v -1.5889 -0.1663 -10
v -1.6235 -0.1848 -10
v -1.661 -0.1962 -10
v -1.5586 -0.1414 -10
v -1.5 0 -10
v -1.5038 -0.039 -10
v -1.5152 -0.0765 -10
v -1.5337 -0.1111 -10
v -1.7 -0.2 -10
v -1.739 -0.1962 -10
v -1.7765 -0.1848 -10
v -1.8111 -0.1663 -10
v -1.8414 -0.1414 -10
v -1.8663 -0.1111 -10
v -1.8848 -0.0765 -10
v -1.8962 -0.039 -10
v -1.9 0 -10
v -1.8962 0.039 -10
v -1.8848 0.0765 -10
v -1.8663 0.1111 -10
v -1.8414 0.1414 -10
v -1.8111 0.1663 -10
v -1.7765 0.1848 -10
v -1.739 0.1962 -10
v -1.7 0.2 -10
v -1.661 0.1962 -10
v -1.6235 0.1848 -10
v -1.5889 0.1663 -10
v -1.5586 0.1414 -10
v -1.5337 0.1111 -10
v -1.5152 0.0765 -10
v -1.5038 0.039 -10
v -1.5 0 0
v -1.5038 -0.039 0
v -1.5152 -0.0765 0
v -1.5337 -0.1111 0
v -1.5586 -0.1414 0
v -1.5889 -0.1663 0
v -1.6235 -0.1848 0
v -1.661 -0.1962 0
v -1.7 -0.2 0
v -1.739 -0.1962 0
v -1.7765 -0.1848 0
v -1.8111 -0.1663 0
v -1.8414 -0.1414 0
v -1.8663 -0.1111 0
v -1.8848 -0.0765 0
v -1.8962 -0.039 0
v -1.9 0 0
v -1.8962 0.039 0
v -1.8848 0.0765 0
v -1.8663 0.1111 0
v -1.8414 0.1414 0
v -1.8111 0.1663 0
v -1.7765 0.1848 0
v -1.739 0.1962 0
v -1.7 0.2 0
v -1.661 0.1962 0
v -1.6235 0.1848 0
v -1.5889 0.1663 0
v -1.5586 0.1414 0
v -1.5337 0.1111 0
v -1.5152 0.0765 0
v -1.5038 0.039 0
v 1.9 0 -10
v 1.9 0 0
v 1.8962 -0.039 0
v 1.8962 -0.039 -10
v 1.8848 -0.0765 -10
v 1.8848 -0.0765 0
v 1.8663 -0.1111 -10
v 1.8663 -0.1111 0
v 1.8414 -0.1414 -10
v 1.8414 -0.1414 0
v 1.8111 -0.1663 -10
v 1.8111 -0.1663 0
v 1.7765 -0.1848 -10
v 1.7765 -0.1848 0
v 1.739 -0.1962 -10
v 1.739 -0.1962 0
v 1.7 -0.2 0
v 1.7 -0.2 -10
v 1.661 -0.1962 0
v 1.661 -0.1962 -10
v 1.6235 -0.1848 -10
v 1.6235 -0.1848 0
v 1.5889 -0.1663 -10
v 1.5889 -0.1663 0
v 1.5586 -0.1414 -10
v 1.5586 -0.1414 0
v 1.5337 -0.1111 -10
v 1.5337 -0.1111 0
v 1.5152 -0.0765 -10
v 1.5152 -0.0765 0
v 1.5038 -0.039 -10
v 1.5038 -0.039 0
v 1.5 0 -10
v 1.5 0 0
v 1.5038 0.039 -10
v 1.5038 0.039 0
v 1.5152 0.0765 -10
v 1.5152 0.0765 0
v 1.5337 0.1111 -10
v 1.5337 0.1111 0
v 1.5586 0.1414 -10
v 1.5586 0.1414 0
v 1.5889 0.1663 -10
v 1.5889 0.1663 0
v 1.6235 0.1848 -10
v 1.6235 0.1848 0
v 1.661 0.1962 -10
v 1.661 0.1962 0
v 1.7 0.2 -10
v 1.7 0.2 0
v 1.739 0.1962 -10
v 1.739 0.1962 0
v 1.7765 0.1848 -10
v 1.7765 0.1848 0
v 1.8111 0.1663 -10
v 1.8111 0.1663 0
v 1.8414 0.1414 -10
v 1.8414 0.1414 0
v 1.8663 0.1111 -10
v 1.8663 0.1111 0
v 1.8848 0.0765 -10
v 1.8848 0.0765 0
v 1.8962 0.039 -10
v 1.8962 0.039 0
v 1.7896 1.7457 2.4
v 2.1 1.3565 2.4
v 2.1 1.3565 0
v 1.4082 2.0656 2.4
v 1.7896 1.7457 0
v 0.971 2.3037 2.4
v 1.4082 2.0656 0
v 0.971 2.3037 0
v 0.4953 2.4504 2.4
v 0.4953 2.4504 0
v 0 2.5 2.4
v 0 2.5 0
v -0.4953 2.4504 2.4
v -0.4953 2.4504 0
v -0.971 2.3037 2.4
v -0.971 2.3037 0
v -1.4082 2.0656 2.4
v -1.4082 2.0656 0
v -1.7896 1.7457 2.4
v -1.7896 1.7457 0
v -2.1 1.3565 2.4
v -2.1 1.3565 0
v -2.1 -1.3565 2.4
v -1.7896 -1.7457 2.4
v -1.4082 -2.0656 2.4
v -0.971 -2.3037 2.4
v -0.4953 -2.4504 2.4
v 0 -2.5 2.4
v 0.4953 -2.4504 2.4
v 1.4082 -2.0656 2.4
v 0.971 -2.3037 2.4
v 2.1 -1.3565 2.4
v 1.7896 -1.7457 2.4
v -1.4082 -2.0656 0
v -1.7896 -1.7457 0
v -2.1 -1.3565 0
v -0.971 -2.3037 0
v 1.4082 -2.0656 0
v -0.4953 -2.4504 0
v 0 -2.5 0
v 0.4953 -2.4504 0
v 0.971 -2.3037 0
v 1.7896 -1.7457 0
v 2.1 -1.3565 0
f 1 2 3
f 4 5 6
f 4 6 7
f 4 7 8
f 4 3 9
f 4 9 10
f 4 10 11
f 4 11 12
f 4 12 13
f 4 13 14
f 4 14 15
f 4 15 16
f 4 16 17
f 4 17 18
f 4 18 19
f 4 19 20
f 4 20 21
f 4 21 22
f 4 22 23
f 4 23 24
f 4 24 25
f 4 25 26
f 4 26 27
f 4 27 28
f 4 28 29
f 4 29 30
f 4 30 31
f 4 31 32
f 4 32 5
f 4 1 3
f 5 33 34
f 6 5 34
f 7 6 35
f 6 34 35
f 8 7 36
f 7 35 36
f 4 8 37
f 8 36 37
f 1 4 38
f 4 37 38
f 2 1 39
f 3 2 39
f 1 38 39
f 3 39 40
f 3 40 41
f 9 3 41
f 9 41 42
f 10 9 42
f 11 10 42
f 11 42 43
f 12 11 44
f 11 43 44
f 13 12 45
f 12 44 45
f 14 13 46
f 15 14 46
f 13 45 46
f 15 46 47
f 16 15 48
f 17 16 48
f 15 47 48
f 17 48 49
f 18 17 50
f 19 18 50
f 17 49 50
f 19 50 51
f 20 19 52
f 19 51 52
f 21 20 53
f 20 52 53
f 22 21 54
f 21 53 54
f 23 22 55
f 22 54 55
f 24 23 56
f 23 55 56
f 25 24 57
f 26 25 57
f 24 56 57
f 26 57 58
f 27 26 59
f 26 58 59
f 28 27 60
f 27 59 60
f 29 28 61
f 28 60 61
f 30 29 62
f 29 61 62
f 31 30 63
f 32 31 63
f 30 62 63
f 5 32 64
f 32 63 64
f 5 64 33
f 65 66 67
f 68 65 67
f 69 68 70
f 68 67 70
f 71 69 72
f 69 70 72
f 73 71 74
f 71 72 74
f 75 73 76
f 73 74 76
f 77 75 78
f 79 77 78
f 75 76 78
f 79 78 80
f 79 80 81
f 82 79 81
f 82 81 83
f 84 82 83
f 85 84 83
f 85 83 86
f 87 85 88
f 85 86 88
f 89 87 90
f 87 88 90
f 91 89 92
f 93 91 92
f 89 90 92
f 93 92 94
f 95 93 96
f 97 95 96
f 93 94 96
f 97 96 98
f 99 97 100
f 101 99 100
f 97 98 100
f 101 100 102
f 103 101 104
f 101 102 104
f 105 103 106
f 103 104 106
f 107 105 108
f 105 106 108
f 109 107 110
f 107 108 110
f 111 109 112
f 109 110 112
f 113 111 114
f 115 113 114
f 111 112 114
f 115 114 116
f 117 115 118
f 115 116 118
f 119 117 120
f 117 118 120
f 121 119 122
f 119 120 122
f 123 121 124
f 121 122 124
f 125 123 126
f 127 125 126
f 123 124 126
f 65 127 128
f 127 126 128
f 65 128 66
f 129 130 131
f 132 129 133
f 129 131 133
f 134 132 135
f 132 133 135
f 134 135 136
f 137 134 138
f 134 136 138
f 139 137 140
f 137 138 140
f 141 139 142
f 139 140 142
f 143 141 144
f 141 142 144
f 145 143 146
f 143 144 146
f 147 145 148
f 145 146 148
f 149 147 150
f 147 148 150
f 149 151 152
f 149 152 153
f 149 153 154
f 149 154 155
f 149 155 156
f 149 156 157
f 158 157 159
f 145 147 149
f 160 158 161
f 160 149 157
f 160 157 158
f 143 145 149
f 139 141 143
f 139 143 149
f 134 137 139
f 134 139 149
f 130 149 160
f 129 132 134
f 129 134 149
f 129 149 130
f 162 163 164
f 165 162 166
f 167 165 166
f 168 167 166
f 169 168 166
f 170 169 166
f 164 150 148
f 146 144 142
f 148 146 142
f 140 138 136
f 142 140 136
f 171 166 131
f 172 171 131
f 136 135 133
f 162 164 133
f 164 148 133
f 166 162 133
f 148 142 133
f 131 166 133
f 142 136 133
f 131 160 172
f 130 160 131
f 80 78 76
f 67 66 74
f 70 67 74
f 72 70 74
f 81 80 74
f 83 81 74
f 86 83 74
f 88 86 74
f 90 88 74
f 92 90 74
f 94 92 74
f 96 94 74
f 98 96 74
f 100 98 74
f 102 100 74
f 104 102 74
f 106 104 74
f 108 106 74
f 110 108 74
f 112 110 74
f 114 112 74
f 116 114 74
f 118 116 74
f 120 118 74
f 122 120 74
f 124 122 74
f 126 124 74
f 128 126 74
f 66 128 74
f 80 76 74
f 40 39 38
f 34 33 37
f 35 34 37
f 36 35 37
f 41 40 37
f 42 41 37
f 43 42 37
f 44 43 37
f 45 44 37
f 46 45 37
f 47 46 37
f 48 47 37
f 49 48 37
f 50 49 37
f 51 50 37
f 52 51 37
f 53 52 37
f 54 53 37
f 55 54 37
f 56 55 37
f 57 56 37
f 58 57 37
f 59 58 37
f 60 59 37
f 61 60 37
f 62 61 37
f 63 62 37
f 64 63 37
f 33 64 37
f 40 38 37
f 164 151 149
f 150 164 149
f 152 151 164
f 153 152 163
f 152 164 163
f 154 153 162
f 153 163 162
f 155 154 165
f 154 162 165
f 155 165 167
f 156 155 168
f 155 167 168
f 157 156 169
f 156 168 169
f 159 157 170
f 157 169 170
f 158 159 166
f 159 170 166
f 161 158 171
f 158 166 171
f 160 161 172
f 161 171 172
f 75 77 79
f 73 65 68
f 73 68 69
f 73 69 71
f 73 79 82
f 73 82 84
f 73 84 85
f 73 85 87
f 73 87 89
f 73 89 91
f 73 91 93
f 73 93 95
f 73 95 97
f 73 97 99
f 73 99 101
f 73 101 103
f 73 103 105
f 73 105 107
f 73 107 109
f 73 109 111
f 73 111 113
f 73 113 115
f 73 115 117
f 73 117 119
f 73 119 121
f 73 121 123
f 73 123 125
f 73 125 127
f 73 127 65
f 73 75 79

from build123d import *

# Parameters (mm, degrees)
F0_R     = 2.5
F1_DEPTH = 2.4
F2_R     = 0.2
F3_DEPTH = 10
F4_W     = 4.2
F4_H     = 10.528826
F5_DEPTH = 25


with BuildPart() as f1:
    # F0 (on Top) → F1 (new body)
    with BuildSketch(Plane.XY):
        Circle(F0_R)
    extrude(amount=F1_DEPTH)


with BuildPart() as f3:
    # F2 (on face) → F3 (new body)
    with BuildSketch(Plane(origin=(0, 0, 0), x_dir=(1, 0, 0), z_dir=(0, 0, -1))):
        with Locations((-1.7, 0)):
            Circle(F2_R)
        with Locations((1.7, 0)):
            Circle(F2_R)
    extrude(amount=F3_DEPTH)


with BuildPart() as f5_tool:
    # F4 (on face) → F5 (new body)
    with BuildSketch(Plane.XY.offset(2.4)):
        with Locations((0, -0.543658)):
            Rectangle(F4_W, F4_H)
    extrude(amount=-F5_DEPTH)


with BuildPart() as f1_1:
    add(f1.part)

    # F5: intersect by f5_tool
    add(f5_tool.part, mode=Mode.INTERSECT)


with BuildPart() as f3_1:
    add(f3.part)

    # F5: intersect by f5_tool
    add(f5_tool.part, mode=Mode.INTERSECT)


solid = Compound([f1_1.part, f3_1.part])
